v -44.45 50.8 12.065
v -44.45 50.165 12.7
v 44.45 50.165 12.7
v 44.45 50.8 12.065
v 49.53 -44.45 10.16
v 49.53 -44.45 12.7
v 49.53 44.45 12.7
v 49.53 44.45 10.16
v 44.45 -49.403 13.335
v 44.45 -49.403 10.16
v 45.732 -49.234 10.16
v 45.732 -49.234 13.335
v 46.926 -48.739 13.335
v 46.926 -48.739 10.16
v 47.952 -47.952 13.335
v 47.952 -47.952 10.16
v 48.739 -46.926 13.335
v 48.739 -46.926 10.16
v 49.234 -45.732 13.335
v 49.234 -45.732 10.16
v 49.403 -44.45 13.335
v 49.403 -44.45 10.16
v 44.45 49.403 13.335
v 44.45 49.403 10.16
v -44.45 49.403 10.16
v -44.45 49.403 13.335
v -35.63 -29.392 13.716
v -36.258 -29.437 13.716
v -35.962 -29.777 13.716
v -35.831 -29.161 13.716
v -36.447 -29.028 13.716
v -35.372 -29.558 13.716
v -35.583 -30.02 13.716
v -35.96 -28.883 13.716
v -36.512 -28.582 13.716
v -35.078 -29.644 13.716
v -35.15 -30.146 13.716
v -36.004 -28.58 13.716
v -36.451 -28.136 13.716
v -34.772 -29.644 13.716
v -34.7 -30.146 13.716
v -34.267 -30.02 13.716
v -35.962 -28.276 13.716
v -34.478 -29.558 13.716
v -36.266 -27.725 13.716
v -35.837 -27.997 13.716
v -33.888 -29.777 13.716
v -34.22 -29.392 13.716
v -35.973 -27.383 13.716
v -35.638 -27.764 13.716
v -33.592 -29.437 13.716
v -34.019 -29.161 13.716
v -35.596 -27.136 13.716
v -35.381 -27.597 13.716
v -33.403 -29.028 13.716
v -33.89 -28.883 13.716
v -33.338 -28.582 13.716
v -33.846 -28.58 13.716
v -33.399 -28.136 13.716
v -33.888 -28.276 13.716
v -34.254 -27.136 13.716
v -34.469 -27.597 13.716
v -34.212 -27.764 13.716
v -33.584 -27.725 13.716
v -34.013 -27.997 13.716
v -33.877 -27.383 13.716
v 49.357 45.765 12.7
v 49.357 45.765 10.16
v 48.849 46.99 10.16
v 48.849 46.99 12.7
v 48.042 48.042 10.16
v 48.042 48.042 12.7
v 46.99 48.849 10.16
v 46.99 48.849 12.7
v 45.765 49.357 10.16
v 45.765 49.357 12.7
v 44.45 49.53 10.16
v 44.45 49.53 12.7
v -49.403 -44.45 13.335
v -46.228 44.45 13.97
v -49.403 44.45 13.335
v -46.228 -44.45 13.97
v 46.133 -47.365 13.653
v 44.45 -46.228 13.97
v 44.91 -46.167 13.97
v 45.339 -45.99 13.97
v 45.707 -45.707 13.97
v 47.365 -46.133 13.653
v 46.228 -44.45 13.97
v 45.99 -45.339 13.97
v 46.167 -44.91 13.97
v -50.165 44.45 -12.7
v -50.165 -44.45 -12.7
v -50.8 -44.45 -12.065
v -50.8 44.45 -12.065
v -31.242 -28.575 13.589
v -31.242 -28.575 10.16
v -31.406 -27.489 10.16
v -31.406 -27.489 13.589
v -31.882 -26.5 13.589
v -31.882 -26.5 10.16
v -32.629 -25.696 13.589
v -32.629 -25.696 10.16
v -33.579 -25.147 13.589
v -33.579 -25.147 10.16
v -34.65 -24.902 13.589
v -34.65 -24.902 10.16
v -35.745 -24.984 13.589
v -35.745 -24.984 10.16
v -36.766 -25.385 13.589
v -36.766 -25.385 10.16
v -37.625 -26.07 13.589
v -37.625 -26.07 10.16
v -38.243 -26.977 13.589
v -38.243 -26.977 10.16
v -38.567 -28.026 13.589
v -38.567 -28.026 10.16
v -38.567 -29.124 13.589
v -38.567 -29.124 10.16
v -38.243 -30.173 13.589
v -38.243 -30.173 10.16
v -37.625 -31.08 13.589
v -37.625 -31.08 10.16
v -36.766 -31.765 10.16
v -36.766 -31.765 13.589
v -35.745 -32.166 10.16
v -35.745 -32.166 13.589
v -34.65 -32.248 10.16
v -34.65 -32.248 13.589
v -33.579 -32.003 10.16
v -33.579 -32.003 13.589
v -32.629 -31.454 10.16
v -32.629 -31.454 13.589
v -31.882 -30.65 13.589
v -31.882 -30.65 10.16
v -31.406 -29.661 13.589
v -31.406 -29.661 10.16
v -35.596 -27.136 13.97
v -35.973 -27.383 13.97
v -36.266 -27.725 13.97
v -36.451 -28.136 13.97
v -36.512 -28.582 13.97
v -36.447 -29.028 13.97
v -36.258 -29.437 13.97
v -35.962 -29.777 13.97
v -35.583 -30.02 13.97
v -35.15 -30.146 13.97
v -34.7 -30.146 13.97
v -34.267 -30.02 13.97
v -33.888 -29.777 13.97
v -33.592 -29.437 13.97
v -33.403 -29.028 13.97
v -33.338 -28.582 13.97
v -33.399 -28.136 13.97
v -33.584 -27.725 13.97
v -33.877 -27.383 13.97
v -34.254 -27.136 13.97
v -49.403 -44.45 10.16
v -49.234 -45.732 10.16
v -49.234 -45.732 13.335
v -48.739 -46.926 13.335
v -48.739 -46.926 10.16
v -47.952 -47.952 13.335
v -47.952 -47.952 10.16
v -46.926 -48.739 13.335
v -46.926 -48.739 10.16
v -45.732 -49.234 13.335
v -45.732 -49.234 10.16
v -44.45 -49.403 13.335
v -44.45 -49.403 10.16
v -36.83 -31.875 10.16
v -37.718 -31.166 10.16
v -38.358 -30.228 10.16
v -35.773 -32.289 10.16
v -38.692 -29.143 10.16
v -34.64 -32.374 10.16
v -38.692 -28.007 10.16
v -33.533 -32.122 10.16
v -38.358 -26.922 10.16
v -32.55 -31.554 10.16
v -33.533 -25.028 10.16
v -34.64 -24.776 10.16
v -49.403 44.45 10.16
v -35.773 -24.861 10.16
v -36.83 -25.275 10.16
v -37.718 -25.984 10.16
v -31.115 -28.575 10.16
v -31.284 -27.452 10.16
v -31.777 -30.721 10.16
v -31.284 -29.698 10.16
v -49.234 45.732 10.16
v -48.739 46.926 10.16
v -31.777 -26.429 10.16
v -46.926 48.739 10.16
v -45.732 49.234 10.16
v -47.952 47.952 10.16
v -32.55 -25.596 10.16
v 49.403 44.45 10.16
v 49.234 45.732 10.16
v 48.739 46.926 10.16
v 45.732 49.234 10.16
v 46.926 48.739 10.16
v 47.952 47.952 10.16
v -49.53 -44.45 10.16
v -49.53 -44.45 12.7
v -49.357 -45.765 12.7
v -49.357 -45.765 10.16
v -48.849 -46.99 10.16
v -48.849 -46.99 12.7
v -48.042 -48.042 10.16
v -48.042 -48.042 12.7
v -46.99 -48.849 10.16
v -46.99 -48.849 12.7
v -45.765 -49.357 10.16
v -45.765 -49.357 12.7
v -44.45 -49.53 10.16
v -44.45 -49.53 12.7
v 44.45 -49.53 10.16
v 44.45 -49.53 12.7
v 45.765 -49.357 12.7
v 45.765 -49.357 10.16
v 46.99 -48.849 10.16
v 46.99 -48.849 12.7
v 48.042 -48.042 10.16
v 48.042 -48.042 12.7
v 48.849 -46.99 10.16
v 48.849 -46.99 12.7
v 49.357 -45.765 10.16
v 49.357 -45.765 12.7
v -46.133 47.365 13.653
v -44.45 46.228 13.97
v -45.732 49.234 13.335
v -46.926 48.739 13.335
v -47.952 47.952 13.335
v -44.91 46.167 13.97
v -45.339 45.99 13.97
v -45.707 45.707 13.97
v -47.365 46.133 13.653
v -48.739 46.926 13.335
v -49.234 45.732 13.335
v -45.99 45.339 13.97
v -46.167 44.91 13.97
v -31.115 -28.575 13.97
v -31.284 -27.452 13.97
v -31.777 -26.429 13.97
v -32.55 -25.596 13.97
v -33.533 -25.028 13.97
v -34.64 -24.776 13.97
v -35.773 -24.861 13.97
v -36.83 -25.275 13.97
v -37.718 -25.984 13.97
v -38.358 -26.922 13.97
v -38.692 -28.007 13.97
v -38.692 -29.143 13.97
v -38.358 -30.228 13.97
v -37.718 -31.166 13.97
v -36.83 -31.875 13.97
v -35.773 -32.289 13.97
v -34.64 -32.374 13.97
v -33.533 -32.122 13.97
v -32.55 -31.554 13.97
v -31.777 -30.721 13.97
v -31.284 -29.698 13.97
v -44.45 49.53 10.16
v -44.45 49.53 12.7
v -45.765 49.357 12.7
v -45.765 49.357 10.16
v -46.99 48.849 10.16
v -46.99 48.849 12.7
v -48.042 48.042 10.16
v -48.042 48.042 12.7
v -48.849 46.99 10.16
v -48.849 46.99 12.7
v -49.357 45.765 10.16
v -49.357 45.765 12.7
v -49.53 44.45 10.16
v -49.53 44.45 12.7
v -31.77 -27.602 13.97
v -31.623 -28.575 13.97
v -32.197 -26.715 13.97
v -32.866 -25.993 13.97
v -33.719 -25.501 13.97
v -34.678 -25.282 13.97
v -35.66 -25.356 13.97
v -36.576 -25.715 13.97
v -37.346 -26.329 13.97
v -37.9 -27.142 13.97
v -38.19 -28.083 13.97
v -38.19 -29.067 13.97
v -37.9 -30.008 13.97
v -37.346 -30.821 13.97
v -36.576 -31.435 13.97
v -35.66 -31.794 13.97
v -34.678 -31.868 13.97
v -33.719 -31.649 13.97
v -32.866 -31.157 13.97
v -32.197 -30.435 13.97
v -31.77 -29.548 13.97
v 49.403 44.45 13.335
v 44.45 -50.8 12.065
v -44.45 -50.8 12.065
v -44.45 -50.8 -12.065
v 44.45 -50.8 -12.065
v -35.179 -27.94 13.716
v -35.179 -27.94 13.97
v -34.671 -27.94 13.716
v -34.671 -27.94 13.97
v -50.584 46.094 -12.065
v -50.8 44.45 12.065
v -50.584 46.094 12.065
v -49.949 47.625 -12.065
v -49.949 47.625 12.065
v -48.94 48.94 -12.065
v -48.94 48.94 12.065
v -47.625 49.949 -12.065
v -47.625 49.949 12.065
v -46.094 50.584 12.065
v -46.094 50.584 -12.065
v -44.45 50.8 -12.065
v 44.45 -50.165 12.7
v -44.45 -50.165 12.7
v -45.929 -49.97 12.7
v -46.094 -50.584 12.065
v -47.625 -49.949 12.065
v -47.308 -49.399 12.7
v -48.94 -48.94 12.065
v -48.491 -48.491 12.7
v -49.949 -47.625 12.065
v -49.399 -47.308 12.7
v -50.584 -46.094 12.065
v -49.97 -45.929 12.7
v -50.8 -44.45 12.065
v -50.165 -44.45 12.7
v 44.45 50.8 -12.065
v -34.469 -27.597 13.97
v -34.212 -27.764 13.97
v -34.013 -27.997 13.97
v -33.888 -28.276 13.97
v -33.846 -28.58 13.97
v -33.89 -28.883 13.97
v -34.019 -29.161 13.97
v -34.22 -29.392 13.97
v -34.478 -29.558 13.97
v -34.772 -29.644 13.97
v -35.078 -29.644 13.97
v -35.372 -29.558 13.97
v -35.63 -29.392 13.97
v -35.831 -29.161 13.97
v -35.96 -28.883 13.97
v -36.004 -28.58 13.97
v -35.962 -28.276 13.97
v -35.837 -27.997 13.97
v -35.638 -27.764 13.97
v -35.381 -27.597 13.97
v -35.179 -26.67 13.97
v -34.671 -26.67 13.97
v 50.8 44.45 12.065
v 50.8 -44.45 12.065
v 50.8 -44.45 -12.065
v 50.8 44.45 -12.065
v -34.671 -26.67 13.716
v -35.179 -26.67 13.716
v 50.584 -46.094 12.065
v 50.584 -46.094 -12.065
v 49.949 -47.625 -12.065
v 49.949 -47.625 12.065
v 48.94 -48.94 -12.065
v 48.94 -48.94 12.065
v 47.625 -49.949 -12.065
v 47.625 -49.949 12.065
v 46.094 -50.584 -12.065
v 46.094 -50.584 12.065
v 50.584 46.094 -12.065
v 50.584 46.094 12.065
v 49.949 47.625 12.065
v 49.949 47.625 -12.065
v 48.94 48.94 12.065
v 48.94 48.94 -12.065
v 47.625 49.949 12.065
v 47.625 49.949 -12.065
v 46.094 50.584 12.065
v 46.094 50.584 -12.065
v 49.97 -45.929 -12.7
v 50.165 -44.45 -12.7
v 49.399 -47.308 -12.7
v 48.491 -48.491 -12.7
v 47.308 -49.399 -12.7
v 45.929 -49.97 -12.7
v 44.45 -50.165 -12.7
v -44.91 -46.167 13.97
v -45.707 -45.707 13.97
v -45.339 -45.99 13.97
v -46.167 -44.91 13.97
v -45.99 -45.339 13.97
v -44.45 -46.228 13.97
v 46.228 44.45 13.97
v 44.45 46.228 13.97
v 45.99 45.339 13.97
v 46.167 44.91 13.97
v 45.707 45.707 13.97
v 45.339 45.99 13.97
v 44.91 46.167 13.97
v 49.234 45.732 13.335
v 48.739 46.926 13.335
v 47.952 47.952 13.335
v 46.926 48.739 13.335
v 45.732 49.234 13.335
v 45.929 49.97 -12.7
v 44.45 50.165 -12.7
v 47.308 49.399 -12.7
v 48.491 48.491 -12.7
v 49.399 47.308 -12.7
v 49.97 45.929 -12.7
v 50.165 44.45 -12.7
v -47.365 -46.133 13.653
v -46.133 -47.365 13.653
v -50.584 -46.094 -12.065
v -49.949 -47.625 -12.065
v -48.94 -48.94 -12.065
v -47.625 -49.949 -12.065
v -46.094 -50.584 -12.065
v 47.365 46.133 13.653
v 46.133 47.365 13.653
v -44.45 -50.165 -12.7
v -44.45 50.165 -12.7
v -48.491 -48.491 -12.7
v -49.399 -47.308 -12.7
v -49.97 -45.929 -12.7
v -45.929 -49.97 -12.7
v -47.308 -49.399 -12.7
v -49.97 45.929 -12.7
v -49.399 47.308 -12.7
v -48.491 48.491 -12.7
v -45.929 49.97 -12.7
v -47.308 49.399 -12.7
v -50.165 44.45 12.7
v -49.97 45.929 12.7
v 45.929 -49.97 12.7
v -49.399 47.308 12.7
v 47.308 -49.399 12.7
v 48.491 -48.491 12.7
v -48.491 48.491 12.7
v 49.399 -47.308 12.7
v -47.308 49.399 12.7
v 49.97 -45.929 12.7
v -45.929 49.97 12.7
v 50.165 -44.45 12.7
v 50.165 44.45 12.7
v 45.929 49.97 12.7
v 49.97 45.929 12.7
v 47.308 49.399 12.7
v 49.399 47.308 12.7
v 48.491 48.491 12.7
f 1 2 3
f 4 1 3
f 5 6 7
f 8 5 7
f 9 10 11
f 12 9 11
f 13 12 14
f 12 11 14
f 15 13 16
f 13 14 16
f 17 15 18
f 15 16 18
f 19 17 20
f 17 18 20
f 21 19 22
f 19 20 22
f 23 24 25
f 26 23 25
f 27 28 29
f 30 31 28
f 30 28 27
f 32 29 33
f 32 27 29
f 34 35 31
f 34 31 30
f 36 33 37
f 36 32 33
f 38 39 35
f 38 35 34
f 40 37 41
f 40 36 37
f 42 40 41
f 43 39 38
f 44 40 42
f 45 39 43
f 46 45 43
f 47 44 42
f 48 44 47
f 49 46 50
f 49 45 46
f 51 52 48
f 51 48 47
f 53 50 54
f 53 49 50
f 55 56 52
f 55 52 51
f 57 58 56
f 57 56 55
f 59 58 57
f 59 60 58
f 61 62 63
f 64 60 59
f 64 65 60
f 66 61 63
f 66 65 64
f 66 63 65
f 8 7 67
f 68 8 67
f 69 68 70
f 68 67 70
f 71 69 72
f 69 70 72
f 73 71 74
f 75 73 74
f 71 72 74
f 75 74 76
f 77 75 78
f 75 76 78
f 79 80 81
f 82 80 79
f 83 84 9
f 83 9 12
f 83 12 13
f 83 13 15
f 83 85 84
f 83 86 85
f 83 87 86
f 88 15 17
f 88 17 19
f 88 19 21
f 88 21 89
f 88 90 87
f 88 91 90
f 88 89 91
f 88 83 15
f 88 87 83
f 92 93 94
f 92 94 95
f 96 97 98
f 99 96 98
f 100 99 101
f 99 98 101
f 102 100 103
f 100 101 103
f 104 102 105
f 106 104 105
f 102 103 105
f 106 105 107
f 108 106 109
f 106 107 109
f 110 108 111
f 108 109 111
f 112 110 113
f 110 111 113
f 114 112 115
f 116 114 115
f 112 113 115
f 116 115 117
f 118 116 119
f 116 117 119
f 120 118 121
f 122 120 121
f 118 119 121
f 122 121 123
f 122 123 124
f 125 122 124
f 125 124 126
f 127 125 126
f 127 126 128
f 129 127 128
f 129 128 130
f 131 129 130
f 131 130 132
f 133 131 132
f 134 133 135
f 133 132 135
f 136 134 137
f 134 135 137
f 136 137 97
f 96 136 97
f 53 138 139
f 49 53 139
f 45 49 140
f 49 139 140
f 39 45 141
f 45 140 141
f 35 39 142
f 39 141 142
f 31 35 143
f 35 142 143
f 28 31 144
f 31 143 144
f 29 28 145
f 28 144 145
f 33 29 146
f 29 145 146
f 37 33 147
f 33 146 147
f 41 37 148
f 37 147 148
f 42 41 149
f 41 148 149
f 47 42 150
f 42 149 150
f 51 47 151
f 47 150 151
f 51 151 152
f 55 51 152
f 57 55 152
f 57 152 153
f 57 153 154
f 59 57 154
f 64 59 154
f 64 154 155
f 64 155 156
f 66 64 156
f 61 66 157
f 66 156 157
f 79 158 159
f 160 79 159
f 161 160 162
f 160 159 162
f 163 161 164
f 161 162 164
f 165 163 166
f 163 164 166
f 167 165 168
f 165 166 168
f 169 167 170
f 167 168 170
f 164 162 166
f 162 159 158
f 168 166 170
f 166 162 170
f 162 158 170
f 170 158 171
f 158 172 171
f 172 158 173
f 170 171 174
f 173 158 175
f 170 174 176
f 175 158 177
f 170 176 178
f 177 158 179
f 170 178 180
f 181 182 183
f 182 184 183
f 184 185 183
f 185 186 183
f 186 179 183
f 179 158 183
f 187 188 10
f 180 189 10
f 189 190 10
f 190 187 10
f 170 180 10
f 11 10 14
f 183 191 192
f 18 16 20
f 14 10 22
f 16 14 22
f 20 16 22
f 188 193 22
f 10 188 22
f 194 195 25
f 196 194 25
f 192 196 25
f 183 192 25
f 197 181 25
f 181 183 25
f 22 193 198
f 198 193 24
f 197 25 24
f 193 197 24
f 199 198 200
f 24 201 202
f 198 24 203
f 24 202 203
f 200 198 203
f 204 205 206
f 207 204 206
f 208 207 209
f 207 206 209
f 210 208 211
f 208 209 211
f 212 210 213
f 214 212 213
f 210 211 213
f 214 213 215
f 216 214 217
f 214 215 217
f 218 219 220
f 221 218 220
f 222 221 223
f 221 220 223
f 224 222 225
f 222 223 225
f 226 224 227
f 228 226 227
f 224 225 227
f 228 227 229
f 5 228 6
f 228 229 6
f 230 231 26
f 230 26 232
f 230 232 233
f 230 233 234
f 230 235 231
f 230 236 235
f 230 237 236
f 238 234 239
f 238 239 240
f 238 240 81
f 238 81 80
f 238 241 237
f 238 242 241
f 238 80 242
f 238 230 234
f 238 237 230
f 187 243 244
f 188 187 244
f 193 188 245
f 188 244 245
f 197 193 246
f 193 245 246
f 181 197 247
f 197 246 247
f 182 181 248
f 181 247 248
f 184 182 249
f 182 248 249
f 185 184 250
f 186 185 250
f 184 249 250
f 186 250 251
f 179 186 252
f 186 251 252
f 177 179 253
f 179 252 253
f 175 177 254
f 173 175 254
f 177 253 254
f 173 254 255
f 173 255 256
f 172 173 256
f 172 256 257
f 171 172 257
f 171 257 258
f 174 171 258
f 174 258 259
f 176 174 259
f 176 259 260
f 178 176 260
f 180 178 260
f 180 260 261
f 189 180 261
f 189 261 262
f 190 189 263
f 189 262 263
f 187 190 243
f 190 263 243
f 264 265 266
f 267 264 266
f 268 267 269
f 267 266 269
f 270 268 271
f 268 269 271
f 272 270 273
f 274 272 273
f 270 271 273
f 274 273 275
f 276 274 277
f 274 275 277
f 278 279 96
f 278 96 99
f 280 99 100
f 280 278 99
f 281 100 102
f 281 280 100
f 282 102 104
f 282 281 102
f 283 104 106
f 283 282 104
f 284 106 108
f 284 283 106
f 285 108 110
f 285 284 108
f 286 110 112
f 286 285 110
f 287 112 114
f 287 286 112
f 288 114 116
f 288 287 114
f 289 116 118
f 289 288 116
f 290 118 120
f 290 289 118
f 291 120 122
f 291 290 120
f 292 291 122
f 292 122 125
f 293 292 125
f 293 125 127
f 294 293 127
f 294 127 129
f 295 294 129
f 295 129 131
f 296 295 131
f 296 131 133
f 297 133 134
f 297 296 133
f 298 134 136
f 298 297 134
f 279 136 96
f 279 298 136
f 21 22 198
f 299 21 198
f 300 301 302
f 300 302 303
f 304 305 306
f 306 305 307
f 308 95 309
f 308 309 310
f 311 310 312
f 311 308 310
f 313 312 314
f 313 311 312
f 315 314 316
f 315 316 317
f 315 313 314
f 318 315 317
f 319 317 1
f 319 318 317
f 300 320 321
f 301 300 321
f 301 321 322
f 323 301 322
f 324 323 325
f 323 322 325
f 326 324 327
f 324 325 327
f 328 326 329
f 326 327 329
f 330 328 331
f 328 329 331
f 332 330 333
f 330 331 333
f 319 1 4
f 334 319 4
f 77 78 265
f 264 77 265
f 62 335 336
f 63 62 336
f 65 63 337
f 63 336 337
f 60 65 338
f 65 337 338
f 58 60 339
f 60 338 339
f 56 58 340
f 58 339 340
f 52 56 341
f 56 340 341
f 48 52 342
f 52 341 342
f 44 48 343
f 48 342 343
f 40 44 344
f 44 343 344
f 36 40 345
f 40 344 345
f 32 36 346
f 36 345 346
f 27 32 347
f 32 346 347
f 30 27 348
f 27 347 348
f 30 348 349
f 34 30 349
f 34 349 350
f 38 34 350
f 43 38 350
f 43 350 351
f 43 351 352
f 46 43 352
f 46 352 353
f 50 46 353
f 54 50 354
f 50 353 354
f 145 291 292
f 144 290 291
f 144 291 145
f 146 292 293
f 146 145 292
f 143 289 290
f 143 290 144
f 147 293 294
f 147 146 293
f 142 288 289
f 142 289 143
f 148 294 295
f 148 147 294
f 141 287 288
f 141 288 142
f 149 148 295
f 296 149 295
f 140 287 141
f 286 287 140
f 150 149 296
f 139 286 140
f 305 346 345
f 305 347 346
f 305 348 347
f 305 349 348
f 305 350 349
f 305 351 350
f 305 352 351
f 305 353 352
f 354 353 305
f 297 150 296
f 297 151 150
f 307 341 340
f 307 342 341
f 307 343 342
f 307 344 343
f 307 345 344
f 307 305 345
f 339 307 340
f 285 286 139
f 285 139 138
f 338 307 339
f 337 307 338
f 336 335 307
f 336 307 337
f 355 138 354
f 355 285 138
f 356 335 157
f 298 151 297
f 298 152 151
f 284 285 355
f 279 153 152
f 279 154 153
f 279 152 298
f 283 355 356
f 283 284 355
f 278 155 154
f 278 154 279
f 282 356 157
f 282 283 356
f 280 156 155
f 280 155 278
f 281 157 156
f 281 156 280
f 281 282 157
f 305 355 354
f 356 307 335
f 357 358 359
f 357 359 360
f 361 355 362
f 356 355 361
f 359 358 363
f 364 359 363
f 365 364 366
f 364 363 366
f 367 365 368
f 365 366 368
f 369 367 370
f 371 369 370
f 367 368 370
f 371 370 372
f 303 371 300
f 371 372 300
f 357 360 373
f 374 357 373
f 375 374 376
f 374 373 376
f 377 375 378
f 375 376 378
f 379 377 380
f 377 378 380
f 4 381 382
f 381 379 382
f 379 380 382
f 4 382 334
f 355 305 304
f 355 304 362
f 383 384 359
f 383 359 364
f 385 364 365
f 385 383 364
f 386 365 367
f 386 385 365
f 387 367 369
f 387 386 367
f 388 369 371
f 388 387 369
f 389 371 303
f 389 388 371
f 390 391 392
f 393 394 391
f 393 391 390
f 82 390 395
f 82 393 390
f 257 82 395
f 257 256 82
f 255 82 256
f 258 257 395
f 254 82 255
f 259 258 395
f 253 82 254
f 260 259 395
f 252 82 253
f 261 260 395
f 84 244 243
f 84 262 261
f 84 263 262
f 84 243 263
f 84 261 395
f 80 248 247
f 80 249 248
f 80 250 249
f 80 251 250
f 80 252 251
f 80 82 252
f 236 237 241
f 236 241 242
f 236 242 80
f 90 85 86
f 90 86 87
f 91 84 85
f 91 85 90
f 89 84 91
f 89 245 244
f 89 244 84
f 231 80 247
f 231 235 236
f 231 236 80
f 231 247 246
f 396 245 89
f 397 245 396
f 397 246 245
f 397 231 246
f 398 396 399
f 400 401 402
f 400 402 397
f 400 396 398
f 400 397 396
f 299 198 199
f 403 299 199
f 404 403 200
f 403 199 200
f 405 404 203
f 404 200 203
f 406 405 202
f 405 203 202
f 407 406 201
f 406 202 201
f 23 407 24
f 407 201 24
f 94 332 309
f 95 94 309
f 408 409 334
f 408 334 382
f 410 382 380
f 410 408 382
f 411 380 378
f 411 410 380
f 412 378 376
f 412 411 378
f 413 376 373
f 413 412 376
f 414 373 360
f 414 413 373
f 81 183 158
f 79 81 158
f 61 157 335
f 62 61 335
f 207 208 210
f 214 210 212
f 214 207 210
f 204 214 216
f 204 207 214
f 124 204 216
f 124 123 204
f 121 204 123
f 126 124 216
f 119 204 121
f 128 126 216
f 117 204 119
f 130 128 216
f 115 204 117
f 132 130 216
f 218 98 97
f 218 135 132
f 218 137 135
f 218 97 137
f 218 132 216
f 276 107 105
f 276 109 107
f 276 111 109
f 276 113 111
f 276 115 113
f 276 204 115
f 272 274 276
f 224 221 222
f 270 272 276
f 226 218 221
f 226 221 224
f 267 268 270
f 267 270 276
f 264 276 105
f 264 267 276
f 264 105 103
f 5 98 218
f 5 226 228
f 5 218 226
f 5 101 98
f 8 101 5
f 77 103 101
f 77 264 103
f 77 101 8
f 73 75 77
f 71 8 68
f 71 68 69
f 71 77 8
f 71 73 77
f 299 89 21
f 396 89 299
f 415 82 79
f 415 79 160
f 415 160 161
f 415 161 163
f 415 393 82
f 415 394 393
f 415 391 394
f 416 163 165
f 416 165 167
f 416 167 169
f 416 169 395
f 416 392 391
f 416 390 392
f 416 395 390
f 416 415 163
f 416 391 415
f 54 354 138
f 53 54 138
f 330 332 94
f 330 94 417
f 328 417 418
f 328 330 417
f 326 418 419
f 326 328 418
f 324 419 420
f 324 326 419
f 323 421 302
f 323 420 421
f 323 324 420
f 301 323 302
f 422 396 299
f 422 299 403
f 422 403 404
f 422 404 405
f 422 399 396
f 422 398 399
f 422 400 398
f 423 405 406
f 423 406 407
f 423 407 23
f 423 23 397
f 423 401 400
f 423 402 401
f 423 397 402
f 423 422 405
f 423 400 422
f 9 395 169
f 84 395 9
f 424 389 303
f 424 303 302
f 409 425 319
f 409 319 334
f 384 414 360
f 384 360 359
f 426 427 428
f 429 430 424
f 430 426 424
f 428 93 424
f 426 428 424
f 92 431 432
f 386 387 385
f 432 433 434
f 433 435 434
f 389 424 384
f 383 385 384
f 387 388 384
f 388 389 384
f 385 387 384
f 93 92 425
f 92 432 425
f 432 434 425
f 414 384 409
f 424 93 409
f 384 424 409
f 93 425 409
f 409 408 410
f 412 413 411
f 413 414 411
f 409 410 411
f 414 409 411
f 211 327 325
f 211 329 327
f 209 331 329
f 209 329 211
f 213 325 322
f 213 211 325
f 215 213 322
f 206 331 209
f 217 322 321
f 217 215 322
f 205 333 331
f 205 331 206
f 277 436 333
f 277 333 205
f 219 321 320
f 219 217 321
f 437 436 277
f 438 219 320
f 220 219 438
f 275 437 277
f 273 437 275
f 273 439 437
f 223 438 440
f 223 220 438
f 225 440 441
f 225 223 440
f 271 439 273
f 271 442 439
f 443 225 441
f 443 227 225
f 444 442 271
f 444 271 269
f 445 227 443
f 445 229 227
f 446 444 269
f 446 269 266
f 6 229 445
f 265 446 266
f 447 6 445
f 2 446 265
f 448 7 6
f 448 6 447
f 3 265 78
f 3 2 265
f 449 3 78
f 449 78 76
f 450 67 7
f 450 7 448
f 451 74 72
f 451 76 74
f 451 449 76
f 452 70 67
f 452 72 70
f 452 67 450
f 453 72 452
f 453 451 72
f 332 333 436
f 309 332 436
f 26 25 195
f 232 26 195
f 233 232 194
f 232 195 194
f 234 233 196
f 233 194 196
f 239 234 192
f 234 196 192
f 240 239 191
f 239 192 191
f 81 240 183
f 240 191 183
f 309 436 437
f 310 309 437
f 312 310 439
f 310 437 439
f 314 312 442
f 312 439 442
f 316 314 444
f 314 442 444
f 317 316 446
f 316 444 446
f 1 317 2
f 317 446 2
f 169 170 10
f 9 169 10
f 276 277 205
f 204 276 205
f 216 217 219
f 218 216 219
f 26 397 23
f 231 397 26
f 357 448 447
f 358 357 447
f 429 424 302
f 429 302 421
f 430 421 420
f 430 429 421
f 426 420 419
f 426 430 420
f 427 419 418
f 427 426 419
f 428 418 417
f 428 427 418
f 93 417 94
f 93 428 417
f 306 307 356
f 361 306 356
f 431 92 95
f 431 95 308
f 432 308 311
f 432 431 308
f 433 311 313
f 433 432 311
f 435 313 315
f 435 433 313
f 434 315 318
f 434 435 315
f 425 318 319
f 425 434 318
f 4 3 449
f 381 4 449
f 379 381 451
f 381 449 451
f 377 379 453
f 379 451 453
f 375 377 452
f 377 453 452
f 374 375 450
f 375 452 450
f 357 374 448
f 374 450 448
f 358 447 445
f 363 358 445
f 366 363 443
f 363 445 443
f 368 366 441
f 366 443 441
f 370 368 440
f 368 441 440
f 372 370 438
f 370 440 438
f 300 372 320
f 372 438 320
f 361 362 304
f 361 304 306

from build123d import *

# Parameters (mm, degrees)
F0_W      = 101.6
F0_H      = 101.6
F1_DEPTH  = 12.7
F2_R      = 6.35
F4_DEPTH  = 2.54
F6_DEPTH  = 3.81
F7_SIZE   = 0.635
F8_SIZE2  = 3.175
F8_SIZE   = 0.635
F9_R      = 3.81
F10_DEPTH = 3.81
F11_R     = 3.683
F12_DEPTH = 3.81
F13_SIZE  = 0.381
F14_W     = 0.508
F14_H     = 1.27
F15_DEPTH = 0.254


with BuildPart() as f1:
    # F0 (on Top) → F1 (new body, symmetric)
    with BuildSketch(Plane.XY):
        Rectangle(F0_W, F0_H)
    extrude(amount=F1_DEPTH, both=True)

    # F2
    f2_edges = [f1.edges().sort_by_distance(p)[0] for p in [
        (-50.8, 50.8, 0),
        (50.8, 50.8, 0),
        (50.8, -50.8, 0),
        (-50.8, -50.8, 0),
    ]]
    fillet(f2_edges, radius=F2_R)

    # F3 (on face) → F4 (cut)
    with BuildSketch(Plane.XY.offset(12.7)):
        with BuildLine():
            Line((44.45, 49.53), (-44.45, 49.53))
            ThreePointArc((-44.45, 49.53), (-48.0421024484, 48.0421024484), (-49.53, 44.45))
            Line((-49.53, 44.45), (-49.53, -44.45))
            ThreePointArc((-49.53, -44.45), (-48.0421024484, -48.0421024484), (-44.45, -49.53))
            Line((-44.45, -49.53), (44.45, -49.53))
            ThreePointArc((44.45, -49.53), (48.0421024484, -48.0421024484), (49.53, -44.45))
            Line((49.53, -44.45), (49.53, 44.45))
            ThreePointArc((49.53, 44.45), (48.0421024484, 48.0421024484), (44.45, 49.53))
        make_face()
    extrude(amount=-F4_DEPTH, mode=Mode.SUBTRACT)

    # F7
    f7_edges = [f1.edges().sort_by_distance(p)[0] for p in [
        (-50.8, 0, 12.7),
        (-48.940128, 48.940128, 12.7),
        (0, 50.8, 12.7),
        (48.940128, 48.940128, 12.7),
        (-50.8, 0, -12.7),
    ]]
    chamfer(f7_edges, length=F7_SIZE)

    # F11 (on face) → F12 (join)
    with BuildSketch(Plane.XY.offset(10.16)):
        with Locations((-34.925, -28.575)):
            Circle(F11_R)
    extrude(amount=F12_DEPTH)

    # F13
    f13_edges = [f1.edges().sort_by_distance(p)[0] for p in [
        (-38.608, -28.575, 13.97),
    ]]
    chamfer(f13_edges, length=F13_SIZE)

    # F14 (on face) → F15 (cut)
    with BuildSketch(Plane.XY.offset(13.97)):
        with BuildLine():
            Line((-35.3812164135, -27.5966407439), (-35.5959064905, -27.1362363881))
            ThreePointArc((-35.5959064905, -27.1362363881), (-34.925, -30.1625), (-34.2540935095, -27.1362363881))
            Line((-34.2540935095, -27.1362363881), (-34.4687835865, -27.5966407439))
            ThreePointArc((-34.4687835865, -27.5966407439), (-34.925, -29.6545), (-35.3812164135, -27.5966407439))
        make_face()
        with Locations((-34.925, -27.305)):
            Rectangle(F14_W, F14_H)
    extrude(amount=-F15_DEPTH, mode=Mode.SUBTRACT)


with BuildPart() as f6:
    # F5 (on face) → F6 (new body)
    with BuildSketch(Plane.XY.offset(10.16)):
        with BuildLine():
            ThreePointArc((-44.45, 49.403), (-47.9522998872, 47.9522998872), (-49.403, 44.45))
            Line((-49.403, 44.45), (-49.403, -44.45))
            ThreePointArc((-49.403, -44.45), (-47.9522998872, -47.9522998872), (-44.45, -49.403))
            Line((-44.45, -49.403), (44.45, -49.403))
            ThreePointArc((44.45, -49.403), (47.9522998872, -47.9522998872), (49.403, -44.45))
            Line((49.403, -44.45), (49.403, 44.45))
            ThreePointArc((49.403, 44.45), (47.9522998872, 47.9522998872), (44.45, 49.403))
            Line((44.45, 49.403), (-44.45, 49.403))
        make_face()
    extrude(amount=F6_DEPTH)

    # F8
    f8_edges = [f6.edges().sort_by_distance(p)[0] for p in [
        (-49.403, 0, 13.97),
    ]]
    f8_side = f6.faces().sort_by_distance((-49.403, 0, 12.065))[0]
    chamfer(f8_edges, length=F8_SIZE, length2=F8_SIZE2, reference=f8_side)

    # F9 (on face) → F10 (cut)
    with BuildSketch(Plane.XY.offset(13.97)):
        with Locations((-34.925, -28.575)):
            Circle(F9_R)
    extrude(amount=-F10_DEPTH, mode=Mode.SUBTRACT)


solid = Compound([f1.part, f6.part])
